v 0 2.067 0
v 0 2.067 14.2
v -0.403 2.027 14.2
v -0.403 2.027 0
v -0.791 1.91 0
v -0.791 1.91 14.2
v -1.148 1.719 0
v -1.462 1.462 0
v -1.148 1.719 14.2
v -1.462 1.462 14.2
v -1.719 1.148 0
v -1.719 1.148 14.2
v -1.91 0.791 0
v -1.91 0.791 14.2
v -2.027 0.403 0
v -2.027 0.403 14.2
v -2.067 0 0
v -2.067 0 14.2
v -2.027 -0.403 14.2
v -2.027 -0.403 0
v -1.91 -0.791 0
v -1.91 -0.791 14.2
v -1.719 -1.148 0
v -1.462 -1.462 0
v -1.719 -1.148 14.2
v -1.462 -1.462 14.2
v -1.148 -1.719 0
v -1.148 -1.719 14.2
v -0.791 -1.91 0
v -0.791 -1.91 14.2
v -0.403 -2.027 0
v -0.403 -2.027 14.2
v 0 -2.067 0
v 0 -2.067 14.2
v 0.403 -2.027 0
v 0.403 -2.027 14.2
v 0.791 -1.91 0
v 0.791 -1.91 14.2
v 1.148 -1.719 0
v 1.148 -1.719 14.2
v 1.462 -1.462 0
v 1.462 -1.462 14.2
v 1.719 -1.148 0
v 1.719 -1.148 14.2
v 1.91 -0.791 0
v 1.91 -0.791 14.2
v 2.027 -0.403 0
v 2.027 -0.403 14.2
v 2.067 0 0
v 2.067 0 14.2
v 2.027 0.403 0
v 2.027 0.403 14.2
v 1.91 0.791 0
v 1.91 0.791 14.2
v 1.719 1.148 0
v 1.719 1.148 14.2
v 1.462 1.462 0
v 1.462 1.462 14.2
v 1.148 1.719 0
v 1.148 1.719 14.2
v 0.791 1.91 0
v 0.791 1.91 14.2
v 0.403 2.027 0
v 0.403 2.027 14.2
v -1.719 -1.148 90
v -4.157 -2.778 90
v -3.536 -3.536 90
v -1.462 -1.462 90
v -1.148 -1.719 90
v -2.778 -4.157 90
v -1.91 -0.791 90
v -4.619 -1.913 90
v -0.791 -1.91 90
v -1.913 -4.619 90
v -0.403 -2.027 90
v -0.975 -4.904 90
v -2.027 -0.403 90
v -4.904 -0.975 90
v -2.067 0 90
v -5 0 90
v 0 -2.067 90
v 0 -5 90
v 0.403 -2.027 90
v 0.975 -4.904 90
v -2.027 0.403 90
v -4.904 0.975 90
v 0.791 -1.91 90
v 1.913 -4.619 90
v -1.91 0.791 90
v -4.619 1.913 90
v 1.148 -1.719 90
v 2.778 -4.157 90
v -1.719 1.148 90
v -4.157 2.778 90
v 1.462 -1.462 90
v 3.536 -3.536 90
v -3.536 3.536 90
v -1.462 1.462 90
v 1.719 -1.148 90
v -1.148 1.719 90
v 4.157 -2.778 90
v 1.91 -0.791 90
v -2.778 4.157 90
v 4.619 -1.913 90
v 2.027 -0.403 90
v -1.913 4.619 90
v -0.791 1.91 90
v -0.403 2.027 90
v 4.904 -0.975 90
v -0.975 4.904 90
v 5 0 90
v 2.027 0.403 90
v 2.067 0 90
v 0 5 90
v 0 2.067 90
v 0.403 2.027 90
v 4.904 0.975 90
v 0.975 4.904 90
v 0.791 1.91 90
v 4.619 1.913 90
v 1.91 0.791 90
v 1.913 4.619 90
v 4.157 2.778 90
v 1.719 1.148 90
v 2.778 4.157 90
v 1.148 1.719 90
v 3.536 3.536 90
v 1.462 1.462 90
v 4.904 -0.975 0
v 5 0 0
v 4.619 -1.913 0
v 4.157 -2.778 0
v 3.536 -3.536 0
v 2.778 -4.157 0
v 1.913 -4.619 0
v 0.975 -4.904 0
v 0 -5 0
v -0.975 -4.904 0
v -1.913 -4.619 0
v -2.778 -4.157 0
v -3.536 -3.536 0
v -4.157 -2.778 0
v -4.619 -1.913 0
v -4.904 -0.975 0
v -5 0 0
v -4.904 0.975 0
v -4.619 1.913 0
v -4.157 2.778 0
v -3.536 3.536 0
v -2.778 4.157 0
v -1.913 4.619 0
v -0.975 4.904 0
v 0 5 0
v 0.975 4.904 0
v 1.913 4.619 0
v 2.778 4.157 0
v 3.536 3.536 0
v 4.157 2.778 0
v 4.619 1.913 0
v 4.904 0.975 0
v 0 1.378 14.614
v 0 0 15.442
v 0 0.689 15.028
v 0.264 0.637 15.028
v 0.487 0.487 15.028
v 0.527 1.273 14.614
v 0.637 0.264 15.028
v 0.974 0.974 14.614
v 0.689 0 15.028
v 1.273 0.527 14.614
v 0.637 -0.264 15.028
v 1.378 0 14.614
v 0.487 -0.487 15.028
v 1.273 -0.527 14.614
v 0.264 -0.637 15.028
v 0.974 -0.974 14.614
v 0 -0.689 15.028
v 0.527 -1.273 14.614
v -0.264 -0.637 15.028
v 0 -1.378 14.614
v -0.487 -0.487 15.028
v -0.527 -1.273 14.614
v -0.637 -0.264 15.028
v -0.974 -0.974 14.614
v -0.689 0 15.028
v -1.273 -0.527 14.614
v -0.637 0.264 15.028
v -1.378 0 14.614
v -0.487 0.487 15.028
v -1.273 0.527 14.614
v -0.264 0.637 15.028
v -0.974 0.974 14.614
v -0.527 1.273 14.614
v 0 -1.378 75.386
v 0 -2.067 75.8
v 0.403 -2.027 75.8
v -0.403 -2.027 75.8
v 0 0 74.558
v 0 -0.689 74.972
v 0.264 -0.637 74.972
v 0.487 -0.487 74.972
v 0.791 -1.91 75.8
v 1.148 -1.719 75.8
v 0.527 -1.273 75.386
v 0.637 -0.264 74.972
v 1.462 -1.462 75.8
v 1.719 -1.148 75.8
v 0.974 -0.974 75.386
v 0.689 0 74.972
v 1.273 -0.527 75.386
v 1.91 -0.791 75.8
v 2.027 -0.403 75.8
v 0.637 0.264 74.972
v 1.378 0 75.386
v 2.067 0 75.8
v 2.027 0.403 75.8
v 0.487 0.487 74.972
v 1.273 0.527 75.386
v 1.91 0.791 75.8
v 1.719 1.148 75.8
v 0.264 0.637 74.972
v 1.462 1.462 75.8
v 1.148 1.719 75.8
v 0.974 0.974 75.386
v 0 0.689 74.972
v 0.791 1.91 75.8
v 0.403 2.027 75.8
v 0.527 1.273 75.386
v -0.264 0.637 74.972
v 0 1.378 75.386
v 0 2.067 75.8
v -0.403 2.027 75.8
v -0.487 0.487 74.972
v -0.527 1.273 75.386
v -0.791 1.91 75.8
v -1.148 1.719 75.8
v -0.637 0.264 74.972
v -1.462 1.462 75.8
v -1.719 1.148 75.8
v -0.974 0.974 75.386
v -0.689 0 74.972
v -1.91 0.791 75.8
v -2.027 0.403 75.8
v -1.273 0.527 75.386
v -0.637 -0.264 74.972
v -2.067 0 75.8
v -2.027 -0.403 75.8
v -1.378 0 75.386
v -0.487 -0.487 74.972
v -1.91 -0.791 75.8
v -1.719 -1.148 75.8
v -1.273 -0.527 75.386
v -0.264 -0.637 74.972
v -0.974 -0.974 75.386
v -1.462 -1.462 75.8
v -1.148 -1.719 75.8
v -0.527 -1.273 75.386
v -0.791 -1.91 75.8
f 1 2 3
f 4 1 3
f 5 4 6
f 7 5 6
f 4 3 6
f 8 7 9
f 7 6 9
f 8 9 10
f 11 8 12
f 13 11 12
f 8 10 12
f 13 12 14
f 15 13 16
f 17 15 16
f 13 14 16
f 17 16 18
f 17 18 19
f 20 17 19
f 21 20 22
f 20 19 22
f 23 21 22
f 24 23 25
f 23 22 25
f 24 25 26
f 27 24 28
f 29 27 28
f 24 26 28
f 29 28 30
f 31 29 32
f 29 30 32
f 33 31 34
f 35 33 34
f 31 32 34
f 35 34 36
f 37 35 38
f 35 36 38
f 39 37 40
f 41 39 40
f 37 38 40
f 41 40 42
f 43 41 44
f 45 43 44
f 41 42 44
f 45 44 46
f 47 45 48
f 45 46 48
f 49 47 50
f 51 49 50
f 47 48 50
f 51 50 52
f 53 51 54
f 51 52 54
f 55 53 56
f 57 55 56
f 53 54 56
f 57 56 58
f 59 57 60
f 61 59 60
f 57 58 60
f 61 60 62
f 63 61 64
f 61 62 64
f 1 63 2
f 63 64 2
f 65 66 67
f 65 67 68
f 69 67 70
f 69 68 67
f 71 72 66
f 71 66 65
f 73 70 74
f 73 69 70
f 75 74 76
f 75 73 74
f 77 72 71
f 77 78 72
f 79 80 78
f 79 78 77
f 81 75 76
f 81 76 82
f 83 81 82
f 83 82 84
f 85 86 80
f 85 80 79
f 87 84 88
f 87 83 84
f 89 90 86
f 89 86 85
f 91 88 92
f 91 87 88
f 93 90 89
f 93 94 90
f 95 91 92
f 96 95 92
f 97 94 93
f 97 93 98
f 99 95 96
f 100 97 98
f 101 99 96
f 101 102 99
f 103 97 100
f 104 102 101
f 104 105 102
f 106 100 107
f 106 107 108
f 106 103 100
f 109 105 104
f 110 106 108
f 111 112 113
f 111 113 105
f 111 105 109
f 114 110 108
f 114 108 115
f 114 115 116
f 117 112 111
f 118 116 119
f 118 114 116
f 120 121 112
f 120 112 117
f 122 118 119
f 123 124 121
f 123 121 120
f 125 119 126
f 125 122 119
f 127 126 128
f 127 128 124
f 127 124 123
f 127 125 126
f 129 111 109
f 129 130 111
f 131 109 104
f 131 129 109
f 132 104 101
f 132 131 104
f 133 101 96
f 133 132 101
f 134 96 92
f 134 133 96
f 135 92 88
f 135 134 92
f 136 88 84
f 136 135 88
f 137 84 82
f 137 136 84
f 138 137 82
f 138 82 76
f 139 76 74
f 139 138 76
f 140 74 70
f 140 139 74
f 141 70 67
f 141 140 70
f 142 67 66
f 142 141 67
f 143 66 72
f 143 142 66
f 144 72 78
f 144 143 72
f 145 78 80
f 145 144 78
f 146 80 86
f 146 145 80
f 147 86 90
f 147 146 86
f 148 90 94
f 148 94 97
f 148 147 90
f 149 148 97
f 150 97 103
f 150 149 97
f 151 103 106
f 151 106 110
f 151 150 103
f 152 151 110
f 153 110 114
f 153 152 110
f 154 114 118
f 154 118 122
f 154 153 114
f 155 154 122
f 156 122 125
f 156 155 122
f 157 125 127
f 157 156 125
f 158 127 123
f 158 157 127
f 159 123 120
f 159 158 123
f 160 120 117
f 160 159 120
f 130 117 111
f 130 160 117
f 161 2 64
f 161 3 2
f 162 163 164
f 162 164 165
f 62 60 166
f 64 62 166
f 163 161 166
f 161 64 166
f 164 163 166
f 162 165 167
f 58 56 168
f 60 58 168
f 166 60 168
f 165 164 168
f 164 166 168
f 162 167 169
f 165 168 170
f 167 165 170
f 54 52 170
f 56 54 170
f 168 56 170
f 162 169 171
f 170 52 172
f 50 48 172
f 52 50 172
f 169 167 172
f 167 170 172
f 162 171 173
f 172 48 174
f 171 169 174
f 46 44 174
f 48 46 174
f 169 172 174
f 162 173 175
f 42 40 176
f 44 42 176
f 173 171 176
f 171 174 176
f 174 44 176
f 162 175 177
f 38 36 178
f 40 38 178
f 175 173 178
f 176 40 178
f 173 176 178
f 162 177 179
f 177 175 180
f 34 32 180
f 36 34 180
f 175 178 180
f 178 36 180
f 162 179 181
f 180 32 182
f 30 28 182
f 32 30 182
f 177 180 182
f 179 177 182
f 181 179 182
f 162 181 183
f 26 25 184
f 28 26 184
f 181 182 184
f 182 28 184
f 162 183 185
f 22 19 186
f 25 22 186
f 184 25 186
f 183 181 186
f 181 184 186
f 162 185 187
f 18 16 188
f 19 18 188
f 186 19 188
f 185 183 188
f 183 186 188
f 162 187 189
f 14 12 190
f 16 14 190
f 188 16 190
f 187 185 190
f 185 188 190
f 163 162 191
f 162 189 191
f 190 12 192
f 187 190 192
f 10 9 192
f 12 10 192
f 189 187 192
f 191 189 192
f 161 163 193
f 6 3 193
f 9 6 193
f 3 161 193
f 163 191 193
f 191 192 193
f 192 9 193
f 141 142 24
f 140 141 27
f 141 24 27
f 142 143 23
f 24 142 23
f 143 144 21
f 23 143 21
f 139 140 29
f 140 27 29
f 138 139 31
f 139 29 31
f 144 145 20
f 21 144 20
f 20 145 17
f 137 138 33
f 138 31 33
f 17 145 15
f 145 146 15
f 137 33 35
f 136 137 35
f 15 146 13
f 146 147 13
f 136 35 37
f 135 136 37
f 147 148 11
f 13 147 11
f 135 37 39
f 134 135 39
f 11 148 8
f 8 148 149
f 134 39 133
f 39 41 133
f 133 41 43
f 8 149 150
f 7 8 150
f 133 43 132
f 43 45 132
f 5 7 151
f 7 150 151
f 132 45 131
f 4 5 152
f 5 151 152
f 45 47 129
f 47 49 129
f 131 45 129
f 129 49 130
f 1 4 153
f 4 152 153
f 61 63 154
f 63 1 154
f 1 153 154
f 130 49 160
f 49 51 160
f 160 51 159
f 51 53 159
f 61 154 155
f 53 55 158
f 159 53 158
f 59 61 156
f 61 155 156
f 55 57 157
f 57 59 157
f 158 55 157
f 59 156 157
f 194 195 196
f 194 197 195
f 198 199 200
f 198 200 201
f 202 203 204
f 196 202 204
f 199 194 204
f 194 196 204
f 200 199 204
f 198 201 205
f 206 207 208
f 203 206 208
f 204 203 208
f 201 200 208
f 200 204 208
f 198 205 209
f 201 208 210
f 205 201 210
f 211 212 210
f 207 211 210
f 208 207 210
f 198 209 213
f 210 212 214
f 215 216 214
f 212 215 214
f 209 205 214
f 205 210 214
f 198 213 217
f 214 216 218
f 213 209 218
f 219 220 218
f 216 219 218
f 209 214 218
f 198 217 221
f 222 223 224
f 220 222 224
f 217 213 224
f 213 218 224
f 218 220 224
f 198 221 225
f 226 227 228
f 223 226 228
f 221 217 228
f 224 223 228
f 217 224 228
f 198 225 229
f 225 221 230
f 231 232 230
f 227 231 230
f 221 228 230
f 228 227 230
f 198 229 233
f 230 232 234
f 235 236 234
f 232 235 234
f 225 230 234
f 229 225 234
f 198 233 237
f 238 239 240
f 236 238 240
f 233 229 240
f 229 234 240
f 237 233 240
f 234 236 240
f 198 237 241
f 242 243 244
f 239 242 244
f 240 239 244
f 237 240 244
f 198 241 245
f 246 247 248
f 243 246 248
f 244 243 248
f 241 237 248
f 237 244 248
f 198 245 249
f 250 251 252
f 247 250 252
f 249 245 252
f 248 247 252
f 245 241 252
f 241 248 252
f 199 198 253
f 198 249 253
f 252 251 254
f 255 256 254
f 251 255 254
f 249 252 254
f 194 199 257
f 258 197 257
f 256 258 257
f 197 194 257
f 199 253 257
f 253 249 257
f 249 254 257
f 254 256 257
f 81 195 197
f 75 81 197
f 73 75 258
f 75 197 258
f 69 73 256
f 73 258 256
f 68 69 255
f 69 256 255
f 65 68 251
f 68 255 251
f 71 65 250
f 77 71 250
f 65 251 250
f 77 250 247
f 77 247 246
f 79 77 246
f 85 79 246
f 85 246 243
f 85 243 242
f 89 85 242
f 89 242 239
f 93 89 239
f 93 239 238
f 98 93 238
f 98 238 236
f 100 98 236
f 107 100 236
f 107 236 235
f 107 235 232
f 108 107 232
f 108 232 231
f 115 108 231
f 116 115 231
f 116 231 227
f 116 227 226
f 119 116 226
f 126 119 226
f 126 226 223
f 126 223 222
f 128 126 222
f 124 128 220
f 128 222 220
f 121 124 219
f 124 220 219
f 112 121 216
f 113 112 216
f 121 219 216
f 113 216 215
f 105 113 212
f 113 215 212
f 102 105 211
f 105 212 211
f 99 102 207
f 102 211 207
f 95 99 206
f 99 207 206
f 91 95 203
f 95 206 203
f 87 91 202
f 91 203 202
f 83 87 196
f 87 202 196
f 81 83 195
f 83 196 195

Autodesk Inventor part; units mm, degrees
ref_plane "YZ Plane" through (0, 0, 0) normal (1, 0, 0) x (0, 1, 0)
ref_plane "XZ Plane" through (0, 0, 0) normal (0, 1, 0) x (-1, 0, 0)
ref_plane "XY Plane" through (0, 0, 0) normal (0, 0, 1) x (1, 0, 0)
sketch "Skizze1" plane through (0, 0, 0) normal (0, 0, 1) x (1, 0, 0)
  line L0 (-7, 0) -> (7, 0) projected
  line L1 (0, -7) -> (0, 7) projected
  circle A0 centre (0, 0) radius 5
  dimension "d0" = 10
extrude "Extrusion1" add sketch "Skizze1" along normal blind 90
sketch "Skizze2" plane through (0, 0, 90) normal (0, 0, 1) x (1, 0, 0)
  point P0 (0, 0)
  point P1 (0, 0)
hole "Bohrung1" at (0, 0, 90) direction (0, 0, -1) diameter 4.134 depth 14.2 tip angle 118 thread size "M5x0.8" class "6H" standard "ISO Metric profile"
sketch "Skizze3" plane through (0, 0, 0) normal (0, 0, -1) x (-1, 0, 0)
  point P0 (0, 0)
  point P1 (-2.4827, -3.6773)
hole "Bohrung2" at (0, 0, 0) direction (0, 0, 1) diameter 4.134 depth 14.2 tip angle 118 thread size "M5x0.8" class "6H" standard "ISO Metric profile"
properties part number "24_0497_0020"
